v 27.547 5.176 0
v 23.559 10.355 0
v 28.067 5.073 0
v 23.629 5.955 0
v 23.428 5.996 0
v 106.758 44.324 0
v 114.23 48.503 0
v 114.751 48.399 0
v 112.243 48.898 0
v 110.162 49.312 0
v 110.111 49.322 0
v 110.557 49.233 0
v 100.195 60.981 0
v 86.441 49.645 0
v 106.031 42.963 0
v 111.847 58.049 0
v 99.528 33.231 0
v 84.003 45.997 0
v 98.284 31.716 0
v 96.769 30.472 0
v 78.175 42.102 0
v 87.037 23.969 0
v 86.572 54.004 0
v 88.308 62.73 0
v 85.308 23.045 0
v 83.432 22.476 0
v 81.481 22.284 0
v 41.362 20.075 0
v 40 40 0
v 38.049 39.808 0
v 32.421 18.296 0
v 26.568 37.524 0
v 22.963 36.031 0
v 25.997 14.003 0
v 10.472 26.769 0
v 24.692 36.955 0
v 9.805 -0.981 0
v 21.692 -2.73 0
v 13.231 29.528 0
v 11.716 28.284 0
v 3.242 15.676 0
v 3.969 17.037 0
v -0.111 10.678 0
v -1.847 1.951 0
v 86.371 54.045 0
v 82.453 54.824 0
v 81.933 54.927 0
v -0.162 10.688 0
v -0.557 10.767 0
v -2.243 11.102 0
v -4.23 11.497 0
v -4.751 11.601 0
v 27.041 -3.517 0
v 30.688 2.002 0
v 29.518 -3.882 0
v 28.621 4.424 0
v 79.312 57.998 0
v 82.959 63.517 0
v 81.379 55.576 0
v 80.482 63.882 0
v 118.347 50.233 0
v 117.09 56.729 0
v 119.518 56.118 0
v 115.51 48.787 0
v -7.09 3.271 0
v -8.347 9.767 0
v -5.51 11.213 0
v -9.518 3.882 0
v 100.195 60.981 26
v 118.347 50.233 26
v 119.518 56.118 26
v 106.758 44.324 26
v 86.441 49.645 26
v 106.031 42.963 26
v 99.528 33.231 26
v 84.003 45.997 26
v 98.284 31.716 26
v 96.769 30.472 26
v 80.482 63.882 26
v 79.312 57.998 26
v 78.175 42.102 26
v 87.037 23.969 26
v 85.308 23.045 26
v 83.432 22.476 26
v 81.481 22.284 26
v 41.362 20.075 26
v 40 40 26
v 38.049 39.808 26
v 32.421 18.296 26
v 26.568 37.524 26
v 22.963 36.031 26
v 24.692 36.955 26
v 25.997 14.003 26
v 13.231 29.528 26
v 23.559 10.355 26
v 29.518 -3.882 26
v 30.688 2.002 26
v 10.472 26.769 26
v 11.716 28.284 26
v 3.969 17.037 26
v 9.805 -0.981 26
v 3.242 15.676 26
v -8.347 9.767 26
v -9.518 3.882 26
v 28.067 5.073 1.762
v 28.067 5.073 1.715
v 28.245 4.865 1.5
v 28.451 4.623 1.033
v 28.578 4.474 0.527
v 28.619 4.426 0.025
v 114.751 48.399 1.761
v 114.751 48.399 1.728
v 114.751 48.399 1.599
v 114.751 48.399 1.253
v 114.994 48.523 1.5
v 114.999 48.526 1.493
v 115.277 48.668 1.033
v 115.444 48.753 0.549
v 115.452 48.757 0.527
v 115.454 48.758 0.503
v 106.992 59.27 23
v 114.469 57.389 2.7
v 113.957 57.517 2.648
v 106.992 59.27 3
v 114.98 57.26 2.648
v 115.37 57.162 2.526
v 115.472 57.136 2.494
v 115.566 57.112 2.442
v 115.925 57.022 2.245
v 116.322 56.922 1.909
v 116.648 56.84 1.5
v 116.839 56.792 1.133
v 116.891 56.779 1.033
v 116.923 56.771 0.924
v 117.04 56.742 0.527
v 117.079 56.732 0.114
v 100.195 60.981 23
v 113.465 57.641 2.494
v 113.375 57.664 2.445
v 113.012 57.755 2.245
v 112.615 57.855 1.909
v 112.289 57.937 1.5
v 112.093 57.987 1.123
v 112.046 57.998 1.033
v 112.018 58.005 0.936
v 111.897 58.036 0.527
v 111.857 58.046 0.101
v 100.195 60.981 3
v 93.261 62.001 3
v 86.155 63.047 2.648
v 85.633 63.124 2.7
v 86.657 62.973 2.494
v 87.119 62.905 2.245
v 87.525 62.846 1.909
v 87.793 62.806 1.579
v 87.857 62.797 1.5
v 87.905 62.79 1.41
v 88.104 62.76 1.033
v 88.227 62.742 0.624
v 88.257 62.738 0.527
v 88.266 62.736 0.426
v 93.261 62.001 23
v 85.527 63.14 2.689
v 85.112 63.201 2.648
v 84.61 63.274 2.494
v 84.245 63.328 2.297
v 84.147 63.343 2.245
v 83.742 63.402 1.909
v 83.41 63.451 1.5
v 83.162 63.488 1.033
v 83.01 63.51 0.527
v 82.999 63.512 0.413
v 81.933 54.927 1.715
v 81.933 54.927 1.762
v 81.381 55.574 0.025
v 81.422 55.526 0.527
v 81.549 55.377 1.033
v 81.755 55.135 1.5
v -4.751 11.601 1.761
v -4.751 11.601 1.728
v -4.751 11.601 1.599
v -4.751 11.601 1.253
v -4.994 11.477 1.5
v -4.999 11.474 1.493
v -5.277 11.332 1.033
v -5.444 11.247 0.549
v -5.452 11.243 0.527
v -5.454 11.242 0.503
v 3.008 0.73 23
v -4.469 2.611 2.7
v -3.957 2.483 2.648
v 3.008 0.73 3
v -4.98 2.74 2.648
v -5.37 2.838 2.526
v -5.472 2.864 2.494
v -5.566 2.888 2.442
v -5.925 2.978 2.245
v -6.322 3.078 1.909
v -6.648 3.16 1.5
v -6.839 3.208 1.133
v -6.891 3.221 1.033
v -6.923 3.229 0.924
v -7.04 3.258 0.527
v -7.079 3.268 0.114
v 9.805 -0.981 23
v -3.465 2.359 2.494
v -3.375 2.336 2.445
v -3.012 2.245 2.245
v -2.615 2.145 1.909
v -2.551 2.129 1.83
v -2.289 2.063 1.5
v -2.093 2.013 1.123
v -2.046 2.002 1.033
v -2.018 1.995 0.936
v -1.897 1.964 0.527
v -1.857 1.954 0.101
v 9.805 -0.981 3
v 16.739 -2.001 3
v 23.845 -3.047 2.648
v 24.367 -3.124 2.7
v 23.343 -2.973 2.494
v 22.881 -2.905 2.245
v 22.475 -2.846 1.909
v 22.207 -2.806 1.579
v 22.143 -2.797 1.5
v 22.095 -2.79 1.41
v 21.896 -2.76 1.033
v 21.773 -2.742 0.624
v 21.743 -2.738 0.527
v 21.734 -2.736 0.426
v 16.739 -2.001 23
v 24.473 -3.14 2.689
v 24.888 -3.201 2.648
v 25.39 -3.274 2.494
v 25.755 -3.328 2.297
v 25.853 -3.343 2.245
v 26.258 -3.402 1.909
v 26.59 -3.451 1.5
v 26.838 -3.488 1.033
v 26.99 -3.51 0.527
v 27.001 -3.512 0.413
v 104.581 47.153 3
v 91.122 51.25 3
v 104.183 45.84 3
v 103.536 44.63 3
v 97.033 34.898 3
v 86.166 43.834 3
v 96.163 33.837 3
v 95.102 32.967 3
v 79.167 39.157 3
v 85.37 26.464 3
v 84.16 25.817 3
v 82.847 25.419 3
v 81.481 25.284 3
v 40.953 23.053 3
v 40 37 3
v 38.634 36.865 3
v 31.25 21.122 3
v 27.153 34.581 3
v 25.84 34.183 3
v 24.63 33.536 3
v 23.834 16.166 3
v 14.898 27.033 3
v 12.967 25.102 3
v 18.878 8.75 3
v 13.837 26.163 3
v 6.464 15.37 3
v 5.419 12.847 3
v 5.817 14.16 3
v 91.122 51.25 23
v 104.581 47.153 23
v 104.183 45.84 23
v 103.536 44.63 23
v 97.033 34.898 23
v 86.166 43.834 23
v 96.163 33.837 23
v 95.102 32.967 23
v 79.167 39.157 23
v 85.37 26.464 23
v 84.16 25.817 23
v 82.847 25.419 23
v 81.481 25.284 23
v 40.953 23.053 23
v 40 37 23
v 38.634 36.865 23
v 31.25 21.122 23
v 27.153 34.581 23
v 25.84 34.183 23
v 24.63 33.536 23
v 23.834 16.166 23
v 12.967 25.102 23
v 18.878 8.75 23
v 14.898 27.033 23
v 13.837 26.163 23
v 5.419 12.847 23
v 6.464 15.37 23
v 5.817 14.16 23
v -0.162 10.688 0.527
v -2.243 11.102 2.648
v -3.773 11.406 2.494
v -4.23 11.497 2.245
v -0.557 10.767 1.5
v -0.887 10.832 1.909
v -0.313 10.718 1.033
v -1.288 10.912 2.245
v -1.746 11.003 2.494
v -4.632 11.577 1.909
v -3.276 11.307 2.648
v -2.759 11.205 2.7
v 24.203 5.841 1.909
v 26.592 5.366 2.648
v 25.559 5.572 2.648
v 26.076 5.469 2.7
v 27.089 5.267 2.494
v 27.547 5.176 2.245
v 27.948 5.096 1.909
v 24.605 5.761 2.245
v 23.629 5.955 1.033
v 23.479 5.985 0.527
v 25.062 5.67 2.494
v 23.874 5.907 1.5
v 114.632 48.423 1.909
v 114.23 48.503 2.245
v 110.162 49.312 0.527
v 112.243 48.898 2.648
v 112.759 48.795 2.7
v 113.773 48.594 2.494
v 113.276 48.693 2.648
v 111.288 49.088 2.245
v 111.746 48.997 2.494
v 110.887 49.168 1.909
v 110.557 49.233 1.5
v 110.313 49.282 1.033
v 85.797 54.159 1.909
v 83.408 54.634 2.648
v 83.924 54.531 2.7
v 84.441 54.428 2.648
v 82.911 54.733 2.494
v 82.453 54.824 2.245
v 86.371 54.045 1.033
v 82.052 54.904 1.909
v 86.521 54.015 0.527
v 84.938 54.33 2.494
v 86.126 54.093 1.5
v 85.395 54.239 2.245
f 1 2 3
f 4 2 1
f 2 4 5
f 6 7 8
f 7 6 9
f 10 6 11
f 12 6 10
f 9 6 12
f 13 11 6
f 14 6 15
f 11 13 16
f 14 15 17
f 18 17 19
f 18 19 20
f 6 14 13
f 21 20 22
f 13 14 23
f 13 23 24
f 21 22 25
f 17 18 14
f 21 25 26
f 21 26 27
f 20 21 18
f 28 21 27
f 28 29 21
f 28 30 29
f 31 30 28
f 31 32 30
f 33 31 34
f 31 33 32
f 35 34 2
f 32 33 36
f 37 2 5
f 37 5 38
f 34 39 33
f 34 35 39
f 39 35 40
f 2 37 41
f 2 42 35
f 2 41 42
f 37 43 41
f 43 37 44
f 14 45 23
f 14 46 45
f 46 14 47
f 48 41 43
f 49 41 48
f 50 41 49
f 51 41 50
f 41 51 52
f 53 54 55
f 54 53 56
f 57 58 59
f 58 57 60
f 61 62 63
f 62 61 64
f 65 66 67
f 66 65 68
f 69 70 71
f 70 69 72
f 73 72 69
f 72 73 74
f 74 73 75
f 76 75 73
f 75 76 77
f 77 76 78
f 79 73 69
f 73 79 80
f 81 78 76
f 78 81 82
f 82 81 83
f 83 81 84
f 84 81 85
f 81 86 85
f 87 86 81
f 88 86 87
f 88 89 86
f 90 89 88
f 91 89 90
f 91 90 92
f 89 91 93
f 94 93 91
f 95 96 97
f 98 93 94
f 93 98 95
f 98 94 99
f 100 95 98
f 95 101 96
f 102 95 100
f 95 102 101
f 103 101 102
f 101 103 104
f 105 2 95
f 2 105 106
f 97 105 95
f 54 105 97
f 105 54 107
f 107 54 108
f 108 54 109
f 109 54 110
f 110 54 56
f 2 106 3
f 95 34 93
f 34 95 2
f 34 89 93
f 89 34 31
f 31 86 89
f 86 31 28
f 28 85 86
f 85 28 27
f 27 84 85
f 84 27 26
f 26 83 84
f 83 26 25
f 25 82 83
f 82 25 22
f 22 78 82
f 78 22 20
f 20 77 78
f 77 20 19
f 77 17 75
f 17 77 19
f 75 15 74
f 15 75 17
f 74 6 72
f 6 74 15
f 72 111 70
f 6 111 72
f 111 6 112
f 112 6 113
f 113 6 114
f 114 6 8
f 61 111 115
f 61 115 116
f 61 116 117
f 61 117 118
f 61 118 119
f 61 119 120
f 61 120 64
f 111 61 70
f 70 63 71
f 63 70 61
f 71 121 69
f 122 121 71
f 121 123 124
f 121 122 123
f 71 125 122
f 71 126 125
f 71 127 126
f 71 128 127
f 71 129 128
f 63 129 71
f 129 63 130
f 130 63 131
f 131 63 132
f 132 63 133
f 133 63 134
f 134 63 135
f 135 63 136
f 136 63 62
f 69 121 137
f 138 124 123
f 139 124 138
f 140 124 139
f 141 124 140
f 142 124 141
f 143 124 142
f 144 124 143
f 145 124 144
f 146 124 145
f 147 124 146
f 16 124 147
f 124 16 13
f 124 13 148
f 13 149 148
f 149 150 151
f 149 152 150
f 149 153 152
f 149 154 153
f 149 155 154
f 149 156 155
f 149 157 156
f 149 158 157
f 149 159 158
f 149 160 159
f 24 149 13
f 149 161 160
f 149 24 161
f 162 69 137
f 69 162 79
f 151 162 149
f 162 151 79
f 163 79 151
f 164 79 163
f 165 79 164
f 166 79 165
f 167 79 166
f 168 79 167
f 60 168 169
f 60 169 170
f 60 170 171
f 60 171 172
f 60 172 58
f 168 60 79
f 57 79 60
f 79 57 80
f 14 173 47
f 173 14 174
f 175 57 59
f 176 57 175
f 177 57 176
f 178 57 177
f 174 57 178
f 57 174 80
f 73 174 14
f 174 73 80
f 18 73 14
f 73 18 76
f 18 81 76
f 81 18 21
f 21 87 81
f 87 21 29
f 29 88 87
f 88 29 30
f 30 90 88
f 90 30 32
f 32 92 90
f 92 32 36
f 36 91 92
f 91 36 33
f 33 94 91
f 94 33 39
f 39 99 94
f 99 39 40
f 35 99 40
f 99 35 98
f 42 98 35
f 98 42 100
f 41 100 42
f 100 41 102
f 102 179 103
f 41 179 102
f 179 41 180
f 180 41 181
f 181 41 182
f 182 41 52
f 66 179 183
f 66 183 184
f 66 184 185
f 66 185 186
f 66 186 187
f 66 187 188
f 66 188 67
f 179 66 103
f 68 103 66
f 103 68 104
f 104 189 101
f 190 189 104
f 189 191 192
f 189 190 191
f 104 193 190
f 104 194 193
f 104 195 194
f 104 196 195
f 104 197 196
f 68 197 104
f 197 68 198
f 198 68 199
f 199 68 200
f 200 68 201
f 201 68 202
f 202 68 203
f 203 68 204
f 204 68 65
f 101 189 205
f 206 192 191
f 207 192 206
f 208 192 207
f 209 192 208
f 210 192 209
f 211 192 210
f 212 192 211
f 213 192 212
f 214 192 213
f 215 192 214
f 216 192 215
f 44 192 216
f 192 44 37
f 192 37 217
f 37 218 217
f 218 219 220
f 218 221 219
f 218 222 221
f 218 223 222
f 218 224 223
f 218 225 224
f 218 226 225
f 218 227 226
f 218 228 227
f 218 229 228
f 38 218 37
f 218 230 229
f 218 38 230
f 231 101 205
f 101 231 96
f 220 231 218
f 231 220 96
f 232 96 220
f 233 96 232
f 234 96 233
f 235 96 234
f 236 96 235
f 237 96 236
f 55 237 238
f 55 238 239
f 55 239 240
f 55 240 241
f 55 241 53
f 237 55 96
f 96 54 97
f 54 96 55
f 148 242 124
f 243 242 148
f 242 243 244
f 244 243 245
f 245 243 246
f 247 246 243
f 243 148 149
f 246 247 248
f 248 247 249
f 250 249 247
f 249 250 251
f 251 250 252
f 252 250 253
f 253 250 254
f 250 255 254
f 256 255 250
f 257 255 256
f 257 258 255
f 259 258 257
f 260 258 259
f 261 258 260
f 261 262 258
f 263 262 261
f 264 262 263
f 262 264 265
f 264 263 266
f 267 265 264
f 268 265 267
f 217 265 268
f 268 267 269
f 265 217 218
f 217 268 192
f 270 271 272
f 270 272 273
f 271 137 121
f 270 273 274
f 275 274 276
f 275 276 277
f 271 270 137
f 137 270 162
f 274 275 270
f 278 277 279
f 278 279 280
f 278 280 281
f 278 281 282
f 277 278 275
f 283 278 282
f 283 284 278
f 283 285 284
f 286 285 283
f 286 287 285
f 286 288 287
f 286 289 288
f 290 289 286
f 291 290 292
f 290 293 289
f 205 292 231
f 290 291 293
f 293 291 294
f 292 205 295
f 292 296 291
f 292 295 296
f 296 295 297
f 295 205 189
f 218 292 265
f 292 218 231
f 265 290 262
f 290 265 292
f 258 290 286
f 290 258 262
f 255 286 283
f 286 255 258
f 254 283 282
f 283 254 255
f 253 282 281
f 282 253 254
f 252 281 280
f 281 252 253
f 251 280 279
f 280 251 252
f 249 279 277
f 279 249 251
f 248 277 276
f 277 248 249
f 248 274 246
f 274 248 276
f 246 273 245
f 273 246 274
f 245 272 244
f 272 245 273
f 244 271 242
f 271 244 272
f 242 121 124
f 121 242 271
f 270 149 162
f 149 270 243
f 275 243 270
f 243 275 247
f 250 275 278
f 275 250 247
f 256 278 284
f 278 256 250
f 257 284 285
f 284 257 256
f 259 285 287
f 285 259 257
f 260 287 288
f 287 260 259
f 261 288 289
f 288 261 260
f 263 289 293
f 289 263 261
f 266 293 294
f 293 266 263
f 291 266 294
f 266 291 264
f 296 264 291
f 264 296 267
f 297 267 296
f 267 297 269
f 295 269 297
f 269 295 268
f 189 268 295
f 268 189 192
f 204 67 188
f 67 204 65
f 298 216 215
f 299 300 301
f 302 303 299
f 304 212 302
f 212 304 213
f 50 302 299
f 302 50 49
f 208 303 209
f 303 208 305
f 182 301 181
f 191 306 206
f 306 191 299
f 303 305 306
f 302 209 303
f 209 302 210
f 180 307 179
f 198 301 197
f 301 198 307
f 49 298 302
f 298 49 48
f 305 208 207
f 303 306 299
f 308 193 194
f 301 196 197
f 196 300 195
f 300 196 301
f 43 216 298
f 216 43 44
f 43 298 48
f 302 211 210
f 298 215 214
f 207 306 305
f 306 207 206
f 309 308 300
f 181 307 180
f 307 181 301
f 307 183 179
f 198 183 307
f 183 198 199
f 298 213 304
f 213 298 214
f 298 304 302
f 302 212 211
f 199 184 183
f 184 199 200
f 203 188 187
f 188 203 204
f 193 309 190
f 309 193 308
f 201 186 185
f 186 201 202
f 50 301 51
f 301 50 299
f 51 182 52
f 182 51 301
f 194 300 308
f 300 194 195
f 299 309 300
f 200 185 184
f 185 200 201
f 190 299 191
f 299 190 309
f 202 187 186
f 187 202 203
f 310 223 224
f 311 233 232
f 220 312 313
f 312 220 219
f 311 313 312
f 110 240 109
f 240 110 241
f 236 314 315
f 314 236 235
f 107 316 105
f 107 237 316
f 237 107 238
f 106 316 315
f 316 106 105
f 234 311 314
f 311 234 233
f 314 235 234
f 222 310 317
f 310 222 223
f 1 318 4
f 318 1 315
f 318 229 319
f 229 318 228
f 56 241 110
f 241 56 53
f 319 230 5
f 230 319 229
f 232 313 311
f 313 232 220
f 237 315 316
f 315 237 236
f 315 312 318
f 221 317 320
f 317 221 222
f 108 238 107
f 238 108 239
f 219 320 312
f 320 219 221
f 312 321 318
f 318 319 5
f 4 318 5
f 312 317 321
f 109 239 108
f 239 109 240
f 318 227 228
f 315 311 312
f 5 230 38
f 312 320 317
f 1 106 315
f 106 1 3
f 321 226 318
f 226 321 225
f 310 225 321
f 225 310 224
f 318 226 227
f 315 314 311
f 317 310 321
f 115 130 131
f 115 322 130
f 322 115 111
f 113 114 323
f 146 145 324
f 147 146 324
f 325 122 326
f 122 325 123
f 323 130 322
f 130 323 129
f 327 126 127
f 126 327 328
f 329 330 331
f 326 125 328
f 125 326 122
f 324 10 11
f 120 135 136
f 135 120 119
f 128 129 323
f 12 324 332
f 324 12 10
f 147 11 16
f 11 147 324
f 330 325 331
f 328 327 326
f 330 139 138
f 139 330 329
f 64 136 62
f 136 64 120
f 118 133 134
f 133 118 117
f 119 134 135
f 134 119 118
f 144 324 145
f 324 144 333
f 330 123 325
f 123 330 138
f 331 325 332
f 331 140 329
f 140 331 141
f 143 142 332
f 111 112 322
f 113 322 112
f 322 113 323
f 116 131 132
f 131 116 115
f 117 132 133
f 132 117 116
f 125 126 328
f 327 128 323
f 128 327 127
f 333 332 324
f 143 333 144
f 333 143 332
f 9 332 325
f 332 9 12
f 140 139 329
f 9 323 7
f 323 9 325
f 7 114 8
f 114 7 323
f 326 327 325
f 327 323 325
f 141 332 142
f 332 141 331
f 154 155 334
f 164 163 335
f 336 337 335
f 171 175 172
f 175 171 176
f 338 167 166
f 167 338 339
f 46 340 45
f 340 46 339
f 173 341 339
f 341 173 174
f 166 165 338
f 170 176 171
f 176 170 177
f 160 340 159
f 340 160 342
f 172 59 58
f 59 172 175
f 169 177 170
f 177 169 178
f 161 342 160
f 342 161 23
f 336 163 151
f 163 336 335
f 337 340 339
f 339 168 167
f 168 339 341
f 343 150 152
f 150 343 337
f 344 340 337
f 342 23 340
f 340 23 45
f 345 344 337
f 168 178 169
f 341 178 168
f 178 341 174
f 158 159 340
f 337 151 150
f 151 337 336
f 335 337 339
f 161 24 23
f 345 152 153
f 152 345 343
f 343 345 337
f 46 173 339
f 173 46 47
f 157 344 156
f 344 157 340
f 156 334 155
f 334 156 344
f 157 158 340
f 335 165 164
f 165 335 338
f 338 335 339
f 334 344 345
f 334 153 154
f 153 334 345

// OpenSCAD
$fn = 32;

// ----------------------------------------------------------------------
// Air duct: 20 mm duct, 3 mm wall, 26 mm across
// ----------------------------------------------------------------------

// --- parameters (mm) ---
duct_r = 10;              // duct core radius
duct_d = 20;              // duct core diameter
wall = 3;                 // duct wall thickness
height = 26;              // duct width (extrusion height)
port_r = 19.9;            // port flange half width
port_d = 39.8;            // port flange width
port_t = 6;               // port flange thickness
bolt_d = 5.4;             // port bolt holes
bolt_offset = 14.7;       // bolt hole offset from the port axis

difference() {
  /* outer hull chain: tube with a flat flange plate at every port */
  linear_extrude(height = 26) {
    hull() {
      polygon([[29.518, -3.882], [-9.518, 3.882], [-8.347, 9.767], [30.688, 2.002]]);
      translate([11.756, 8.827]) circle(r = 10);
    }
    hull() {
      translate([11.756, 8.827]) circle(r = 10);
      translate([12.284, 11.481]) circle(r = 10);
    }
    hull() {
      translate([12.284, 11.481]) circle(r = 10);
      translate([18.787, 21.213]) circle(r = 10);
    }
    hull() {
      translate([18.787, 21.213]) circle(r = 10);
      translate([28.519, 27.716]) circle(r = 10);
    }
    hull() {
      translate([28.519, 27.716]) circle(r = 10);
      translate([40, 30]) circle(r = 10);
    }
    hull() {
      translate([40, 30]) circle(r = 10);
      translate([81.481, 32.284]) circle(r = 10);
    }
    hull() {
      translate([81.481, 32.284]) circle(r = 10);
      translate([91.213, 38.787]) circle(r = 10);
    }
    hull() {
      translate([91.213, 38.787]) circle(r = 10);
      translate([97.716, 48.519]) circle(r = 10);
    }
    hull() {
      translate([97.716, 48.519]) circle(r = 10);
      translate([98.244, 51.173]) circle(r = 10);
    }
    hull() {
      translate([98.244, 51.173]) circle(r = 10);
      polygon([[80.482, 63.882], [119.518, 56.118], [118.347, 50.233], [79.312, 57.998]]);
    }
  }
  /* air passage: the same chain inset by the wall, 5 mm proud of the ports */
  translate([0, 0, 3]) linear_extrude(height = 20) {
    hull() {
      translate([9.025, -4.904]) circle(r = 7);
      translate([12.284, 11.481]) circle(r = 7);
    }
    hull() {
      translate([12.284, 11.481]) circle(r = 7);
      translate([18.787, 21.213]) circle(r = 7);
    }
    hull() {
      translate([18.787, 21.213]) circle(r = 7);
      translate([28.519, 27.716]) circle(r = 7);
    }
    hull() {
      translate([28.519, 27.716]) circle(r = 7);
      translate([40, 30]) circle(r = 7);
    }
    hull() {
      translate([40, 30]) circle(r = 7);
      translate([81.481, 32.284]) circle(r = 7);
    }
    hull() {
      translate([81.481, 32.284]) circle(r = 7);
      translate([91.213, 38.787]) circle(r = 7);
    }
    hull() {
      translate([91.213, 38.787]) circle(r = 7);
      translate([97.716, 48.519]) circle(r = 7);
    }
    hull() {
      translate([97.716, 48.519]) circle(r = 7);
      translate([100.975, 64.904]) circle(r = 7);
    }
  }
  translate([10, 0]) rotate([0, 0, -11.25]) translate([-14.7, -2.5]) rotate([-90, 0, 0]) cylinder(h = 11, d = 5.4);
  translate([10, 0]) rotate([0, 0, -11.25]) translate([14.7, -2.5]) rotate([-90, 0, 0]) cylinder(h = 11, d = 5.4);
  translate([100, 60]) rotate([0, 0, 168.75]) translate([-14.7, -2.5]) rotate([-90, 0, 0]) cylinder(h = 11, d = 5.4);
  translate([100, 60]) rotate([0, 0, 168.75]) translate([14.7, -2.5]) rotate([-90, 0, 0]) cylinder(h = 11, d = 5.4);
}
